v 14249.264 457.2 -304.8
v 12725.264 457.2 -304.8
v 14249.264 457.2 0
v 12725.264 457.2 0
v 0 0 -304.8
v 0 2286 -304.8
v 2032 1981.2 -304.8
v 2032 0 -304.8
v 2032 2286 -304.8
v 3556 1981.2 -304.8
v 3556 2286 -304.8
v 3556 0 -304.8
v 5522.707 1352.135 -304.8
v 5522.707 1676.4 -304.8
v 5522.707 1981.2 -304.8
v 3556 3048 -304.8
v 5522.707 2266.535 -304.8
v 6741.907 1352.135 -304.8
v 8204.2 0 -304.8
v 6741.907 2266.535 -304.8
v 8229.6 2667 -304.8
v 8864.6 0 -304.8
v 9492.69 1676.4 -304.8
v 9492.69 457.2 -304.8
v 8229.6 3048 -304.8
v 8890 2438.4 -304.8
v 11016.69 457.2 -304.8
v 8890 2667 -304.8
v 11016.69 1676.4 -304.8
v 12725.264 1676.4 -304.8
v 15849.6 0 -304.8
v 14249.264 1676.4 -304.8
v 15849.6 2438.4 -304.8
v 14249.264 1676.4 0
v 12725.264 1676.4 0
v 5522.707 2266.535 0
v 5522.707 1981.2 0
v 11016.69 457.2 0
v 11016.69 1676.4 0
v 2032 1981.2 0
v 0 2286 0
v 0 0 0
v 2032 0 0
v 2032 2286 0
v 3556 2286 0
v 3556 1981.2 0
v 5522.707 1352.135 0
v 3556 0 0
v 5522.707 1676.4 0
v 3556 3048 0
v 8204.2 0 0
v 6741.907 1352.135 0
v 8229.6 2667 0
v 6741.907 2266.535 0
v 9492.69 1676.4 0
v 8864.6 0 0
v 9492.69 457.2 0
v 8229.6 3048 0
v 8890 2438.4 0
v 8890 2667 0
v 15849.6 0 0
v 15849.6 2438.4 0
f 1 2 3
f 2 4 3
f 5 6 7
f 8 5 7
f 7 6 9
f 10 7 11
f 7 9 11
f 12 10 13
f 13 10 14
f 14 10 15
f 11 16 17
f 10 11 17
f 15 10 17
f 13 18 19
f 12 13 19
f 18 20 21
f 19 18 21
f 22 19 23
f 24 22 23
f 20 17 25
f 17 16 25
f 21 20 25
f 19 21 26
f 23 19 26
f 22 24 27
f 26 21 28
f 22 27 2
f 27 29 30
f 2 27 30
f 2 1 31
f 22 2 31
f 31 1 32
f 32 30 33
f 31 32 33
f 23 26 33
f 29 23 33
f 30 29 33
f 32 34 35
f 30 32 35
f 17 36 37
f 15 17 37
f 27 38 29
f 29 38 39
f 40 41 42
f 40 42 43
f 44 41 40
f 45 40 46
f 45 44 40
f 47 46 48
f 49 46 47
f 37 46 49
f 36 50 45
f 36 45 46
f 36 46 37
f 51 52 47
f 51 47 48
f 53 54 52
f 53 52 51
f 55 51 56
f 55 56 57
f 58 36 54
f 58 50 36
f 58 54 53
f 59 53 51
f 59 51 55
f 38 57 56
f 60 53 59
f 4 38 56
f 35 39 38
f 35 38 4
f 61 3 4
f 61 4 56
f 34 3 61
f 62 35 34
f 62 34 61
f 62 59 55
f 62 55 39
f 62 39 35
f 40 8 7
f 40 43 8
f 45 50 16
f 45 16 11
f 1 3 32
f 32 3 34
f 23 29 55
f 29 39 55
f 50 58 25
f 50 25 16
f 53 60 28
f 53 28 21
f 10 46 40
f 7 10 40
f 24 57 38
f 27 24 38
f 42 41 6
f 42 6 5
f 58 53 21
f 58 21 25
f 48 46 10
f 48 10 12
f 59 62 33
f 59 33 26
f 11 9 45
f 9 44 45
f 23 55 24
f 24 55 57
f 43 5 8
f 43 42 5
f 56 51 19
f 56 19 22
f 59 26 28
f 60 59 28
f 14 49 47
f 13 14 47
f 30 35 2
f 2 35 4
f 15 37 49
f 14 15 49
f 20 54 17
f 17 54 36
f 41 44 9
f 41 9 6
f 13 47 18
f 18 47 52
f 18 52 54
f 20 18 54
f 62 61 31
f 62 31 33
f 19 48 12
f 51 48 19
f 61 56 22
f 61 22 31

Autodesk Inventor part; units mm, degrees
ref_plane "YZ Plane" through (0, 0, 0) normal (1, 0, 0) x (0, 1, 0)
ref_plane "XZ Plane" through (0, 0, 0) normal (0, 1, 0) x (-1, 0, 0)
ref_plane "XY Plane" through (0, 0, 0) normal (0, 0, 1) x (1, 0, 0)
sketch "Sketch2" plane through (0, 0, 0) normal (0, 0, 1) x (1, 0, 0)
  line L0 (0, 0) -> (2032, 0)
  line L1 (2032, 0) -> (2032, 1981.2)
  line L2 (2032, 2286) -> (0, 2286)
  line L3 (0, 2286) -> (0, 0)
  line L4 (2032, 2286) -> (3556, 2286)
  line L5 (3556, 1981.2) -> (2032, 1981.2)
  line L6 (3556, 1981.2) -> (3556, 0) construction
  line L7 (3556, 0) -> (8204.2, 0)
  line L8 (8229.6, 2667) -> (8229.6, 3048)
  line L9 (8229.6, 3048) -> (3556, 3048)
  line L10 (8204.2, 0) -> (8864.6, 0)
  line L11 (8890, 2438.4) -> (8890, 2667)
  line L12 (8890, 2667) -> (8229.6, 2667)
  line L13 (8864.6, 0) -> (15849.6, 0)
  line L14 (15849.6, 0) -> (15849.6, 2438.4)
  line L15 (15849.6, 2438.4) -> (8890, 2438.4)
  line L16 (9492.6899, 457.2) -> (11016.6899, 457.2)
  line L17 (11016.6899, 457.2) -> (11016.6899, 1676.4)
  line L18 (11016.6899, 1676.4) -> (9492.6899, 1676.4)
  line L19 (9492.6899, 1676.4) -> (9492.6899, 457.2)
  line L20 (9492.6899, 457.2) -> (11016.6899, 1676.4) construction
  line L21 (11016.6899, 457.2) -> (9492.6899, 1676.4) construction
  line L22 (12725.2645, 457.2) -> (14249.2645, 457.2)
  line L23 (14249.2645, 457.2) -> (14249.2645, 1676.4)
  line L24 (14249.2645, 1676.4) -> (12725.2645, 1676.4)
  line L25 (12725.2645, 1676.4) -> (12725.2645, 457.2)
  line L26 (12725.2645, 457.2) -> (14249.2645, 1676.4) construction
  line L27 (14249.2645, 457.2) -> (12725.2645, 1676.4) construction
  line L28 (5522.7071, 1352.1351) -> (6741.9071, 1352.1351)
  line L29 (6741.9071, 1352.1351) -> (6741.9071, 2266.5351)
  line L30 (6741.9071, 2266.5351) -> (5522.7071, 2266.5351)
  line L31 (5522.7071, 1352.1351) -> (6741.9071, 2266.5351) construction
  line L32 (6741.9071, 1352.1351) -> (5522.7071, 2266.5351) construction
  line L33 (5522.7071, 2266.5351) -> (5522.7071, 1981.2)
  line L34 (5522.7071, 1676.4) -> (5522.7071, 1352.1351)
  line L35 (3556, 3048) -> (3556, 2286)
  line L36 (3556, 1981.2) -> (3556, 0)
  line L37 (5522.7071, 2266.5351) -> (5522.7071, 1352.1351)
  point P0 (10254.6899, 1066.8)
  point P1 (13487.2645, 1066.8)
  point P2 (6132.3071, 1809.3351)
  dimension "d25" = 2286
  dimension "d26" = 1524
  dimension "d28" = 4673.6
  dimension "d34" = 6959.6
  dimension "d35" = 2438.4
  dimension "d36" = 1524
  dimension "d38" = 1219.2
  dimension "d39" = 1524
  dimension "d40" = 1219.2
  dimension "d41" = 1219.2
  dimension "d42" = 914.4
  dimension "d43" = 660.4
  dimension "d44" = 2667
  dimension "d45" = 3048
  dimension "d46" = 304.8
  dimension "d51" = 3556
  dimension "d52" = 2032
  dimension "d53" = 12293.6
extrude "Extrusion2" add sketch "Sketch2" against normal blind 304.8
properties part number "eastSideofHouseFacingPool"
